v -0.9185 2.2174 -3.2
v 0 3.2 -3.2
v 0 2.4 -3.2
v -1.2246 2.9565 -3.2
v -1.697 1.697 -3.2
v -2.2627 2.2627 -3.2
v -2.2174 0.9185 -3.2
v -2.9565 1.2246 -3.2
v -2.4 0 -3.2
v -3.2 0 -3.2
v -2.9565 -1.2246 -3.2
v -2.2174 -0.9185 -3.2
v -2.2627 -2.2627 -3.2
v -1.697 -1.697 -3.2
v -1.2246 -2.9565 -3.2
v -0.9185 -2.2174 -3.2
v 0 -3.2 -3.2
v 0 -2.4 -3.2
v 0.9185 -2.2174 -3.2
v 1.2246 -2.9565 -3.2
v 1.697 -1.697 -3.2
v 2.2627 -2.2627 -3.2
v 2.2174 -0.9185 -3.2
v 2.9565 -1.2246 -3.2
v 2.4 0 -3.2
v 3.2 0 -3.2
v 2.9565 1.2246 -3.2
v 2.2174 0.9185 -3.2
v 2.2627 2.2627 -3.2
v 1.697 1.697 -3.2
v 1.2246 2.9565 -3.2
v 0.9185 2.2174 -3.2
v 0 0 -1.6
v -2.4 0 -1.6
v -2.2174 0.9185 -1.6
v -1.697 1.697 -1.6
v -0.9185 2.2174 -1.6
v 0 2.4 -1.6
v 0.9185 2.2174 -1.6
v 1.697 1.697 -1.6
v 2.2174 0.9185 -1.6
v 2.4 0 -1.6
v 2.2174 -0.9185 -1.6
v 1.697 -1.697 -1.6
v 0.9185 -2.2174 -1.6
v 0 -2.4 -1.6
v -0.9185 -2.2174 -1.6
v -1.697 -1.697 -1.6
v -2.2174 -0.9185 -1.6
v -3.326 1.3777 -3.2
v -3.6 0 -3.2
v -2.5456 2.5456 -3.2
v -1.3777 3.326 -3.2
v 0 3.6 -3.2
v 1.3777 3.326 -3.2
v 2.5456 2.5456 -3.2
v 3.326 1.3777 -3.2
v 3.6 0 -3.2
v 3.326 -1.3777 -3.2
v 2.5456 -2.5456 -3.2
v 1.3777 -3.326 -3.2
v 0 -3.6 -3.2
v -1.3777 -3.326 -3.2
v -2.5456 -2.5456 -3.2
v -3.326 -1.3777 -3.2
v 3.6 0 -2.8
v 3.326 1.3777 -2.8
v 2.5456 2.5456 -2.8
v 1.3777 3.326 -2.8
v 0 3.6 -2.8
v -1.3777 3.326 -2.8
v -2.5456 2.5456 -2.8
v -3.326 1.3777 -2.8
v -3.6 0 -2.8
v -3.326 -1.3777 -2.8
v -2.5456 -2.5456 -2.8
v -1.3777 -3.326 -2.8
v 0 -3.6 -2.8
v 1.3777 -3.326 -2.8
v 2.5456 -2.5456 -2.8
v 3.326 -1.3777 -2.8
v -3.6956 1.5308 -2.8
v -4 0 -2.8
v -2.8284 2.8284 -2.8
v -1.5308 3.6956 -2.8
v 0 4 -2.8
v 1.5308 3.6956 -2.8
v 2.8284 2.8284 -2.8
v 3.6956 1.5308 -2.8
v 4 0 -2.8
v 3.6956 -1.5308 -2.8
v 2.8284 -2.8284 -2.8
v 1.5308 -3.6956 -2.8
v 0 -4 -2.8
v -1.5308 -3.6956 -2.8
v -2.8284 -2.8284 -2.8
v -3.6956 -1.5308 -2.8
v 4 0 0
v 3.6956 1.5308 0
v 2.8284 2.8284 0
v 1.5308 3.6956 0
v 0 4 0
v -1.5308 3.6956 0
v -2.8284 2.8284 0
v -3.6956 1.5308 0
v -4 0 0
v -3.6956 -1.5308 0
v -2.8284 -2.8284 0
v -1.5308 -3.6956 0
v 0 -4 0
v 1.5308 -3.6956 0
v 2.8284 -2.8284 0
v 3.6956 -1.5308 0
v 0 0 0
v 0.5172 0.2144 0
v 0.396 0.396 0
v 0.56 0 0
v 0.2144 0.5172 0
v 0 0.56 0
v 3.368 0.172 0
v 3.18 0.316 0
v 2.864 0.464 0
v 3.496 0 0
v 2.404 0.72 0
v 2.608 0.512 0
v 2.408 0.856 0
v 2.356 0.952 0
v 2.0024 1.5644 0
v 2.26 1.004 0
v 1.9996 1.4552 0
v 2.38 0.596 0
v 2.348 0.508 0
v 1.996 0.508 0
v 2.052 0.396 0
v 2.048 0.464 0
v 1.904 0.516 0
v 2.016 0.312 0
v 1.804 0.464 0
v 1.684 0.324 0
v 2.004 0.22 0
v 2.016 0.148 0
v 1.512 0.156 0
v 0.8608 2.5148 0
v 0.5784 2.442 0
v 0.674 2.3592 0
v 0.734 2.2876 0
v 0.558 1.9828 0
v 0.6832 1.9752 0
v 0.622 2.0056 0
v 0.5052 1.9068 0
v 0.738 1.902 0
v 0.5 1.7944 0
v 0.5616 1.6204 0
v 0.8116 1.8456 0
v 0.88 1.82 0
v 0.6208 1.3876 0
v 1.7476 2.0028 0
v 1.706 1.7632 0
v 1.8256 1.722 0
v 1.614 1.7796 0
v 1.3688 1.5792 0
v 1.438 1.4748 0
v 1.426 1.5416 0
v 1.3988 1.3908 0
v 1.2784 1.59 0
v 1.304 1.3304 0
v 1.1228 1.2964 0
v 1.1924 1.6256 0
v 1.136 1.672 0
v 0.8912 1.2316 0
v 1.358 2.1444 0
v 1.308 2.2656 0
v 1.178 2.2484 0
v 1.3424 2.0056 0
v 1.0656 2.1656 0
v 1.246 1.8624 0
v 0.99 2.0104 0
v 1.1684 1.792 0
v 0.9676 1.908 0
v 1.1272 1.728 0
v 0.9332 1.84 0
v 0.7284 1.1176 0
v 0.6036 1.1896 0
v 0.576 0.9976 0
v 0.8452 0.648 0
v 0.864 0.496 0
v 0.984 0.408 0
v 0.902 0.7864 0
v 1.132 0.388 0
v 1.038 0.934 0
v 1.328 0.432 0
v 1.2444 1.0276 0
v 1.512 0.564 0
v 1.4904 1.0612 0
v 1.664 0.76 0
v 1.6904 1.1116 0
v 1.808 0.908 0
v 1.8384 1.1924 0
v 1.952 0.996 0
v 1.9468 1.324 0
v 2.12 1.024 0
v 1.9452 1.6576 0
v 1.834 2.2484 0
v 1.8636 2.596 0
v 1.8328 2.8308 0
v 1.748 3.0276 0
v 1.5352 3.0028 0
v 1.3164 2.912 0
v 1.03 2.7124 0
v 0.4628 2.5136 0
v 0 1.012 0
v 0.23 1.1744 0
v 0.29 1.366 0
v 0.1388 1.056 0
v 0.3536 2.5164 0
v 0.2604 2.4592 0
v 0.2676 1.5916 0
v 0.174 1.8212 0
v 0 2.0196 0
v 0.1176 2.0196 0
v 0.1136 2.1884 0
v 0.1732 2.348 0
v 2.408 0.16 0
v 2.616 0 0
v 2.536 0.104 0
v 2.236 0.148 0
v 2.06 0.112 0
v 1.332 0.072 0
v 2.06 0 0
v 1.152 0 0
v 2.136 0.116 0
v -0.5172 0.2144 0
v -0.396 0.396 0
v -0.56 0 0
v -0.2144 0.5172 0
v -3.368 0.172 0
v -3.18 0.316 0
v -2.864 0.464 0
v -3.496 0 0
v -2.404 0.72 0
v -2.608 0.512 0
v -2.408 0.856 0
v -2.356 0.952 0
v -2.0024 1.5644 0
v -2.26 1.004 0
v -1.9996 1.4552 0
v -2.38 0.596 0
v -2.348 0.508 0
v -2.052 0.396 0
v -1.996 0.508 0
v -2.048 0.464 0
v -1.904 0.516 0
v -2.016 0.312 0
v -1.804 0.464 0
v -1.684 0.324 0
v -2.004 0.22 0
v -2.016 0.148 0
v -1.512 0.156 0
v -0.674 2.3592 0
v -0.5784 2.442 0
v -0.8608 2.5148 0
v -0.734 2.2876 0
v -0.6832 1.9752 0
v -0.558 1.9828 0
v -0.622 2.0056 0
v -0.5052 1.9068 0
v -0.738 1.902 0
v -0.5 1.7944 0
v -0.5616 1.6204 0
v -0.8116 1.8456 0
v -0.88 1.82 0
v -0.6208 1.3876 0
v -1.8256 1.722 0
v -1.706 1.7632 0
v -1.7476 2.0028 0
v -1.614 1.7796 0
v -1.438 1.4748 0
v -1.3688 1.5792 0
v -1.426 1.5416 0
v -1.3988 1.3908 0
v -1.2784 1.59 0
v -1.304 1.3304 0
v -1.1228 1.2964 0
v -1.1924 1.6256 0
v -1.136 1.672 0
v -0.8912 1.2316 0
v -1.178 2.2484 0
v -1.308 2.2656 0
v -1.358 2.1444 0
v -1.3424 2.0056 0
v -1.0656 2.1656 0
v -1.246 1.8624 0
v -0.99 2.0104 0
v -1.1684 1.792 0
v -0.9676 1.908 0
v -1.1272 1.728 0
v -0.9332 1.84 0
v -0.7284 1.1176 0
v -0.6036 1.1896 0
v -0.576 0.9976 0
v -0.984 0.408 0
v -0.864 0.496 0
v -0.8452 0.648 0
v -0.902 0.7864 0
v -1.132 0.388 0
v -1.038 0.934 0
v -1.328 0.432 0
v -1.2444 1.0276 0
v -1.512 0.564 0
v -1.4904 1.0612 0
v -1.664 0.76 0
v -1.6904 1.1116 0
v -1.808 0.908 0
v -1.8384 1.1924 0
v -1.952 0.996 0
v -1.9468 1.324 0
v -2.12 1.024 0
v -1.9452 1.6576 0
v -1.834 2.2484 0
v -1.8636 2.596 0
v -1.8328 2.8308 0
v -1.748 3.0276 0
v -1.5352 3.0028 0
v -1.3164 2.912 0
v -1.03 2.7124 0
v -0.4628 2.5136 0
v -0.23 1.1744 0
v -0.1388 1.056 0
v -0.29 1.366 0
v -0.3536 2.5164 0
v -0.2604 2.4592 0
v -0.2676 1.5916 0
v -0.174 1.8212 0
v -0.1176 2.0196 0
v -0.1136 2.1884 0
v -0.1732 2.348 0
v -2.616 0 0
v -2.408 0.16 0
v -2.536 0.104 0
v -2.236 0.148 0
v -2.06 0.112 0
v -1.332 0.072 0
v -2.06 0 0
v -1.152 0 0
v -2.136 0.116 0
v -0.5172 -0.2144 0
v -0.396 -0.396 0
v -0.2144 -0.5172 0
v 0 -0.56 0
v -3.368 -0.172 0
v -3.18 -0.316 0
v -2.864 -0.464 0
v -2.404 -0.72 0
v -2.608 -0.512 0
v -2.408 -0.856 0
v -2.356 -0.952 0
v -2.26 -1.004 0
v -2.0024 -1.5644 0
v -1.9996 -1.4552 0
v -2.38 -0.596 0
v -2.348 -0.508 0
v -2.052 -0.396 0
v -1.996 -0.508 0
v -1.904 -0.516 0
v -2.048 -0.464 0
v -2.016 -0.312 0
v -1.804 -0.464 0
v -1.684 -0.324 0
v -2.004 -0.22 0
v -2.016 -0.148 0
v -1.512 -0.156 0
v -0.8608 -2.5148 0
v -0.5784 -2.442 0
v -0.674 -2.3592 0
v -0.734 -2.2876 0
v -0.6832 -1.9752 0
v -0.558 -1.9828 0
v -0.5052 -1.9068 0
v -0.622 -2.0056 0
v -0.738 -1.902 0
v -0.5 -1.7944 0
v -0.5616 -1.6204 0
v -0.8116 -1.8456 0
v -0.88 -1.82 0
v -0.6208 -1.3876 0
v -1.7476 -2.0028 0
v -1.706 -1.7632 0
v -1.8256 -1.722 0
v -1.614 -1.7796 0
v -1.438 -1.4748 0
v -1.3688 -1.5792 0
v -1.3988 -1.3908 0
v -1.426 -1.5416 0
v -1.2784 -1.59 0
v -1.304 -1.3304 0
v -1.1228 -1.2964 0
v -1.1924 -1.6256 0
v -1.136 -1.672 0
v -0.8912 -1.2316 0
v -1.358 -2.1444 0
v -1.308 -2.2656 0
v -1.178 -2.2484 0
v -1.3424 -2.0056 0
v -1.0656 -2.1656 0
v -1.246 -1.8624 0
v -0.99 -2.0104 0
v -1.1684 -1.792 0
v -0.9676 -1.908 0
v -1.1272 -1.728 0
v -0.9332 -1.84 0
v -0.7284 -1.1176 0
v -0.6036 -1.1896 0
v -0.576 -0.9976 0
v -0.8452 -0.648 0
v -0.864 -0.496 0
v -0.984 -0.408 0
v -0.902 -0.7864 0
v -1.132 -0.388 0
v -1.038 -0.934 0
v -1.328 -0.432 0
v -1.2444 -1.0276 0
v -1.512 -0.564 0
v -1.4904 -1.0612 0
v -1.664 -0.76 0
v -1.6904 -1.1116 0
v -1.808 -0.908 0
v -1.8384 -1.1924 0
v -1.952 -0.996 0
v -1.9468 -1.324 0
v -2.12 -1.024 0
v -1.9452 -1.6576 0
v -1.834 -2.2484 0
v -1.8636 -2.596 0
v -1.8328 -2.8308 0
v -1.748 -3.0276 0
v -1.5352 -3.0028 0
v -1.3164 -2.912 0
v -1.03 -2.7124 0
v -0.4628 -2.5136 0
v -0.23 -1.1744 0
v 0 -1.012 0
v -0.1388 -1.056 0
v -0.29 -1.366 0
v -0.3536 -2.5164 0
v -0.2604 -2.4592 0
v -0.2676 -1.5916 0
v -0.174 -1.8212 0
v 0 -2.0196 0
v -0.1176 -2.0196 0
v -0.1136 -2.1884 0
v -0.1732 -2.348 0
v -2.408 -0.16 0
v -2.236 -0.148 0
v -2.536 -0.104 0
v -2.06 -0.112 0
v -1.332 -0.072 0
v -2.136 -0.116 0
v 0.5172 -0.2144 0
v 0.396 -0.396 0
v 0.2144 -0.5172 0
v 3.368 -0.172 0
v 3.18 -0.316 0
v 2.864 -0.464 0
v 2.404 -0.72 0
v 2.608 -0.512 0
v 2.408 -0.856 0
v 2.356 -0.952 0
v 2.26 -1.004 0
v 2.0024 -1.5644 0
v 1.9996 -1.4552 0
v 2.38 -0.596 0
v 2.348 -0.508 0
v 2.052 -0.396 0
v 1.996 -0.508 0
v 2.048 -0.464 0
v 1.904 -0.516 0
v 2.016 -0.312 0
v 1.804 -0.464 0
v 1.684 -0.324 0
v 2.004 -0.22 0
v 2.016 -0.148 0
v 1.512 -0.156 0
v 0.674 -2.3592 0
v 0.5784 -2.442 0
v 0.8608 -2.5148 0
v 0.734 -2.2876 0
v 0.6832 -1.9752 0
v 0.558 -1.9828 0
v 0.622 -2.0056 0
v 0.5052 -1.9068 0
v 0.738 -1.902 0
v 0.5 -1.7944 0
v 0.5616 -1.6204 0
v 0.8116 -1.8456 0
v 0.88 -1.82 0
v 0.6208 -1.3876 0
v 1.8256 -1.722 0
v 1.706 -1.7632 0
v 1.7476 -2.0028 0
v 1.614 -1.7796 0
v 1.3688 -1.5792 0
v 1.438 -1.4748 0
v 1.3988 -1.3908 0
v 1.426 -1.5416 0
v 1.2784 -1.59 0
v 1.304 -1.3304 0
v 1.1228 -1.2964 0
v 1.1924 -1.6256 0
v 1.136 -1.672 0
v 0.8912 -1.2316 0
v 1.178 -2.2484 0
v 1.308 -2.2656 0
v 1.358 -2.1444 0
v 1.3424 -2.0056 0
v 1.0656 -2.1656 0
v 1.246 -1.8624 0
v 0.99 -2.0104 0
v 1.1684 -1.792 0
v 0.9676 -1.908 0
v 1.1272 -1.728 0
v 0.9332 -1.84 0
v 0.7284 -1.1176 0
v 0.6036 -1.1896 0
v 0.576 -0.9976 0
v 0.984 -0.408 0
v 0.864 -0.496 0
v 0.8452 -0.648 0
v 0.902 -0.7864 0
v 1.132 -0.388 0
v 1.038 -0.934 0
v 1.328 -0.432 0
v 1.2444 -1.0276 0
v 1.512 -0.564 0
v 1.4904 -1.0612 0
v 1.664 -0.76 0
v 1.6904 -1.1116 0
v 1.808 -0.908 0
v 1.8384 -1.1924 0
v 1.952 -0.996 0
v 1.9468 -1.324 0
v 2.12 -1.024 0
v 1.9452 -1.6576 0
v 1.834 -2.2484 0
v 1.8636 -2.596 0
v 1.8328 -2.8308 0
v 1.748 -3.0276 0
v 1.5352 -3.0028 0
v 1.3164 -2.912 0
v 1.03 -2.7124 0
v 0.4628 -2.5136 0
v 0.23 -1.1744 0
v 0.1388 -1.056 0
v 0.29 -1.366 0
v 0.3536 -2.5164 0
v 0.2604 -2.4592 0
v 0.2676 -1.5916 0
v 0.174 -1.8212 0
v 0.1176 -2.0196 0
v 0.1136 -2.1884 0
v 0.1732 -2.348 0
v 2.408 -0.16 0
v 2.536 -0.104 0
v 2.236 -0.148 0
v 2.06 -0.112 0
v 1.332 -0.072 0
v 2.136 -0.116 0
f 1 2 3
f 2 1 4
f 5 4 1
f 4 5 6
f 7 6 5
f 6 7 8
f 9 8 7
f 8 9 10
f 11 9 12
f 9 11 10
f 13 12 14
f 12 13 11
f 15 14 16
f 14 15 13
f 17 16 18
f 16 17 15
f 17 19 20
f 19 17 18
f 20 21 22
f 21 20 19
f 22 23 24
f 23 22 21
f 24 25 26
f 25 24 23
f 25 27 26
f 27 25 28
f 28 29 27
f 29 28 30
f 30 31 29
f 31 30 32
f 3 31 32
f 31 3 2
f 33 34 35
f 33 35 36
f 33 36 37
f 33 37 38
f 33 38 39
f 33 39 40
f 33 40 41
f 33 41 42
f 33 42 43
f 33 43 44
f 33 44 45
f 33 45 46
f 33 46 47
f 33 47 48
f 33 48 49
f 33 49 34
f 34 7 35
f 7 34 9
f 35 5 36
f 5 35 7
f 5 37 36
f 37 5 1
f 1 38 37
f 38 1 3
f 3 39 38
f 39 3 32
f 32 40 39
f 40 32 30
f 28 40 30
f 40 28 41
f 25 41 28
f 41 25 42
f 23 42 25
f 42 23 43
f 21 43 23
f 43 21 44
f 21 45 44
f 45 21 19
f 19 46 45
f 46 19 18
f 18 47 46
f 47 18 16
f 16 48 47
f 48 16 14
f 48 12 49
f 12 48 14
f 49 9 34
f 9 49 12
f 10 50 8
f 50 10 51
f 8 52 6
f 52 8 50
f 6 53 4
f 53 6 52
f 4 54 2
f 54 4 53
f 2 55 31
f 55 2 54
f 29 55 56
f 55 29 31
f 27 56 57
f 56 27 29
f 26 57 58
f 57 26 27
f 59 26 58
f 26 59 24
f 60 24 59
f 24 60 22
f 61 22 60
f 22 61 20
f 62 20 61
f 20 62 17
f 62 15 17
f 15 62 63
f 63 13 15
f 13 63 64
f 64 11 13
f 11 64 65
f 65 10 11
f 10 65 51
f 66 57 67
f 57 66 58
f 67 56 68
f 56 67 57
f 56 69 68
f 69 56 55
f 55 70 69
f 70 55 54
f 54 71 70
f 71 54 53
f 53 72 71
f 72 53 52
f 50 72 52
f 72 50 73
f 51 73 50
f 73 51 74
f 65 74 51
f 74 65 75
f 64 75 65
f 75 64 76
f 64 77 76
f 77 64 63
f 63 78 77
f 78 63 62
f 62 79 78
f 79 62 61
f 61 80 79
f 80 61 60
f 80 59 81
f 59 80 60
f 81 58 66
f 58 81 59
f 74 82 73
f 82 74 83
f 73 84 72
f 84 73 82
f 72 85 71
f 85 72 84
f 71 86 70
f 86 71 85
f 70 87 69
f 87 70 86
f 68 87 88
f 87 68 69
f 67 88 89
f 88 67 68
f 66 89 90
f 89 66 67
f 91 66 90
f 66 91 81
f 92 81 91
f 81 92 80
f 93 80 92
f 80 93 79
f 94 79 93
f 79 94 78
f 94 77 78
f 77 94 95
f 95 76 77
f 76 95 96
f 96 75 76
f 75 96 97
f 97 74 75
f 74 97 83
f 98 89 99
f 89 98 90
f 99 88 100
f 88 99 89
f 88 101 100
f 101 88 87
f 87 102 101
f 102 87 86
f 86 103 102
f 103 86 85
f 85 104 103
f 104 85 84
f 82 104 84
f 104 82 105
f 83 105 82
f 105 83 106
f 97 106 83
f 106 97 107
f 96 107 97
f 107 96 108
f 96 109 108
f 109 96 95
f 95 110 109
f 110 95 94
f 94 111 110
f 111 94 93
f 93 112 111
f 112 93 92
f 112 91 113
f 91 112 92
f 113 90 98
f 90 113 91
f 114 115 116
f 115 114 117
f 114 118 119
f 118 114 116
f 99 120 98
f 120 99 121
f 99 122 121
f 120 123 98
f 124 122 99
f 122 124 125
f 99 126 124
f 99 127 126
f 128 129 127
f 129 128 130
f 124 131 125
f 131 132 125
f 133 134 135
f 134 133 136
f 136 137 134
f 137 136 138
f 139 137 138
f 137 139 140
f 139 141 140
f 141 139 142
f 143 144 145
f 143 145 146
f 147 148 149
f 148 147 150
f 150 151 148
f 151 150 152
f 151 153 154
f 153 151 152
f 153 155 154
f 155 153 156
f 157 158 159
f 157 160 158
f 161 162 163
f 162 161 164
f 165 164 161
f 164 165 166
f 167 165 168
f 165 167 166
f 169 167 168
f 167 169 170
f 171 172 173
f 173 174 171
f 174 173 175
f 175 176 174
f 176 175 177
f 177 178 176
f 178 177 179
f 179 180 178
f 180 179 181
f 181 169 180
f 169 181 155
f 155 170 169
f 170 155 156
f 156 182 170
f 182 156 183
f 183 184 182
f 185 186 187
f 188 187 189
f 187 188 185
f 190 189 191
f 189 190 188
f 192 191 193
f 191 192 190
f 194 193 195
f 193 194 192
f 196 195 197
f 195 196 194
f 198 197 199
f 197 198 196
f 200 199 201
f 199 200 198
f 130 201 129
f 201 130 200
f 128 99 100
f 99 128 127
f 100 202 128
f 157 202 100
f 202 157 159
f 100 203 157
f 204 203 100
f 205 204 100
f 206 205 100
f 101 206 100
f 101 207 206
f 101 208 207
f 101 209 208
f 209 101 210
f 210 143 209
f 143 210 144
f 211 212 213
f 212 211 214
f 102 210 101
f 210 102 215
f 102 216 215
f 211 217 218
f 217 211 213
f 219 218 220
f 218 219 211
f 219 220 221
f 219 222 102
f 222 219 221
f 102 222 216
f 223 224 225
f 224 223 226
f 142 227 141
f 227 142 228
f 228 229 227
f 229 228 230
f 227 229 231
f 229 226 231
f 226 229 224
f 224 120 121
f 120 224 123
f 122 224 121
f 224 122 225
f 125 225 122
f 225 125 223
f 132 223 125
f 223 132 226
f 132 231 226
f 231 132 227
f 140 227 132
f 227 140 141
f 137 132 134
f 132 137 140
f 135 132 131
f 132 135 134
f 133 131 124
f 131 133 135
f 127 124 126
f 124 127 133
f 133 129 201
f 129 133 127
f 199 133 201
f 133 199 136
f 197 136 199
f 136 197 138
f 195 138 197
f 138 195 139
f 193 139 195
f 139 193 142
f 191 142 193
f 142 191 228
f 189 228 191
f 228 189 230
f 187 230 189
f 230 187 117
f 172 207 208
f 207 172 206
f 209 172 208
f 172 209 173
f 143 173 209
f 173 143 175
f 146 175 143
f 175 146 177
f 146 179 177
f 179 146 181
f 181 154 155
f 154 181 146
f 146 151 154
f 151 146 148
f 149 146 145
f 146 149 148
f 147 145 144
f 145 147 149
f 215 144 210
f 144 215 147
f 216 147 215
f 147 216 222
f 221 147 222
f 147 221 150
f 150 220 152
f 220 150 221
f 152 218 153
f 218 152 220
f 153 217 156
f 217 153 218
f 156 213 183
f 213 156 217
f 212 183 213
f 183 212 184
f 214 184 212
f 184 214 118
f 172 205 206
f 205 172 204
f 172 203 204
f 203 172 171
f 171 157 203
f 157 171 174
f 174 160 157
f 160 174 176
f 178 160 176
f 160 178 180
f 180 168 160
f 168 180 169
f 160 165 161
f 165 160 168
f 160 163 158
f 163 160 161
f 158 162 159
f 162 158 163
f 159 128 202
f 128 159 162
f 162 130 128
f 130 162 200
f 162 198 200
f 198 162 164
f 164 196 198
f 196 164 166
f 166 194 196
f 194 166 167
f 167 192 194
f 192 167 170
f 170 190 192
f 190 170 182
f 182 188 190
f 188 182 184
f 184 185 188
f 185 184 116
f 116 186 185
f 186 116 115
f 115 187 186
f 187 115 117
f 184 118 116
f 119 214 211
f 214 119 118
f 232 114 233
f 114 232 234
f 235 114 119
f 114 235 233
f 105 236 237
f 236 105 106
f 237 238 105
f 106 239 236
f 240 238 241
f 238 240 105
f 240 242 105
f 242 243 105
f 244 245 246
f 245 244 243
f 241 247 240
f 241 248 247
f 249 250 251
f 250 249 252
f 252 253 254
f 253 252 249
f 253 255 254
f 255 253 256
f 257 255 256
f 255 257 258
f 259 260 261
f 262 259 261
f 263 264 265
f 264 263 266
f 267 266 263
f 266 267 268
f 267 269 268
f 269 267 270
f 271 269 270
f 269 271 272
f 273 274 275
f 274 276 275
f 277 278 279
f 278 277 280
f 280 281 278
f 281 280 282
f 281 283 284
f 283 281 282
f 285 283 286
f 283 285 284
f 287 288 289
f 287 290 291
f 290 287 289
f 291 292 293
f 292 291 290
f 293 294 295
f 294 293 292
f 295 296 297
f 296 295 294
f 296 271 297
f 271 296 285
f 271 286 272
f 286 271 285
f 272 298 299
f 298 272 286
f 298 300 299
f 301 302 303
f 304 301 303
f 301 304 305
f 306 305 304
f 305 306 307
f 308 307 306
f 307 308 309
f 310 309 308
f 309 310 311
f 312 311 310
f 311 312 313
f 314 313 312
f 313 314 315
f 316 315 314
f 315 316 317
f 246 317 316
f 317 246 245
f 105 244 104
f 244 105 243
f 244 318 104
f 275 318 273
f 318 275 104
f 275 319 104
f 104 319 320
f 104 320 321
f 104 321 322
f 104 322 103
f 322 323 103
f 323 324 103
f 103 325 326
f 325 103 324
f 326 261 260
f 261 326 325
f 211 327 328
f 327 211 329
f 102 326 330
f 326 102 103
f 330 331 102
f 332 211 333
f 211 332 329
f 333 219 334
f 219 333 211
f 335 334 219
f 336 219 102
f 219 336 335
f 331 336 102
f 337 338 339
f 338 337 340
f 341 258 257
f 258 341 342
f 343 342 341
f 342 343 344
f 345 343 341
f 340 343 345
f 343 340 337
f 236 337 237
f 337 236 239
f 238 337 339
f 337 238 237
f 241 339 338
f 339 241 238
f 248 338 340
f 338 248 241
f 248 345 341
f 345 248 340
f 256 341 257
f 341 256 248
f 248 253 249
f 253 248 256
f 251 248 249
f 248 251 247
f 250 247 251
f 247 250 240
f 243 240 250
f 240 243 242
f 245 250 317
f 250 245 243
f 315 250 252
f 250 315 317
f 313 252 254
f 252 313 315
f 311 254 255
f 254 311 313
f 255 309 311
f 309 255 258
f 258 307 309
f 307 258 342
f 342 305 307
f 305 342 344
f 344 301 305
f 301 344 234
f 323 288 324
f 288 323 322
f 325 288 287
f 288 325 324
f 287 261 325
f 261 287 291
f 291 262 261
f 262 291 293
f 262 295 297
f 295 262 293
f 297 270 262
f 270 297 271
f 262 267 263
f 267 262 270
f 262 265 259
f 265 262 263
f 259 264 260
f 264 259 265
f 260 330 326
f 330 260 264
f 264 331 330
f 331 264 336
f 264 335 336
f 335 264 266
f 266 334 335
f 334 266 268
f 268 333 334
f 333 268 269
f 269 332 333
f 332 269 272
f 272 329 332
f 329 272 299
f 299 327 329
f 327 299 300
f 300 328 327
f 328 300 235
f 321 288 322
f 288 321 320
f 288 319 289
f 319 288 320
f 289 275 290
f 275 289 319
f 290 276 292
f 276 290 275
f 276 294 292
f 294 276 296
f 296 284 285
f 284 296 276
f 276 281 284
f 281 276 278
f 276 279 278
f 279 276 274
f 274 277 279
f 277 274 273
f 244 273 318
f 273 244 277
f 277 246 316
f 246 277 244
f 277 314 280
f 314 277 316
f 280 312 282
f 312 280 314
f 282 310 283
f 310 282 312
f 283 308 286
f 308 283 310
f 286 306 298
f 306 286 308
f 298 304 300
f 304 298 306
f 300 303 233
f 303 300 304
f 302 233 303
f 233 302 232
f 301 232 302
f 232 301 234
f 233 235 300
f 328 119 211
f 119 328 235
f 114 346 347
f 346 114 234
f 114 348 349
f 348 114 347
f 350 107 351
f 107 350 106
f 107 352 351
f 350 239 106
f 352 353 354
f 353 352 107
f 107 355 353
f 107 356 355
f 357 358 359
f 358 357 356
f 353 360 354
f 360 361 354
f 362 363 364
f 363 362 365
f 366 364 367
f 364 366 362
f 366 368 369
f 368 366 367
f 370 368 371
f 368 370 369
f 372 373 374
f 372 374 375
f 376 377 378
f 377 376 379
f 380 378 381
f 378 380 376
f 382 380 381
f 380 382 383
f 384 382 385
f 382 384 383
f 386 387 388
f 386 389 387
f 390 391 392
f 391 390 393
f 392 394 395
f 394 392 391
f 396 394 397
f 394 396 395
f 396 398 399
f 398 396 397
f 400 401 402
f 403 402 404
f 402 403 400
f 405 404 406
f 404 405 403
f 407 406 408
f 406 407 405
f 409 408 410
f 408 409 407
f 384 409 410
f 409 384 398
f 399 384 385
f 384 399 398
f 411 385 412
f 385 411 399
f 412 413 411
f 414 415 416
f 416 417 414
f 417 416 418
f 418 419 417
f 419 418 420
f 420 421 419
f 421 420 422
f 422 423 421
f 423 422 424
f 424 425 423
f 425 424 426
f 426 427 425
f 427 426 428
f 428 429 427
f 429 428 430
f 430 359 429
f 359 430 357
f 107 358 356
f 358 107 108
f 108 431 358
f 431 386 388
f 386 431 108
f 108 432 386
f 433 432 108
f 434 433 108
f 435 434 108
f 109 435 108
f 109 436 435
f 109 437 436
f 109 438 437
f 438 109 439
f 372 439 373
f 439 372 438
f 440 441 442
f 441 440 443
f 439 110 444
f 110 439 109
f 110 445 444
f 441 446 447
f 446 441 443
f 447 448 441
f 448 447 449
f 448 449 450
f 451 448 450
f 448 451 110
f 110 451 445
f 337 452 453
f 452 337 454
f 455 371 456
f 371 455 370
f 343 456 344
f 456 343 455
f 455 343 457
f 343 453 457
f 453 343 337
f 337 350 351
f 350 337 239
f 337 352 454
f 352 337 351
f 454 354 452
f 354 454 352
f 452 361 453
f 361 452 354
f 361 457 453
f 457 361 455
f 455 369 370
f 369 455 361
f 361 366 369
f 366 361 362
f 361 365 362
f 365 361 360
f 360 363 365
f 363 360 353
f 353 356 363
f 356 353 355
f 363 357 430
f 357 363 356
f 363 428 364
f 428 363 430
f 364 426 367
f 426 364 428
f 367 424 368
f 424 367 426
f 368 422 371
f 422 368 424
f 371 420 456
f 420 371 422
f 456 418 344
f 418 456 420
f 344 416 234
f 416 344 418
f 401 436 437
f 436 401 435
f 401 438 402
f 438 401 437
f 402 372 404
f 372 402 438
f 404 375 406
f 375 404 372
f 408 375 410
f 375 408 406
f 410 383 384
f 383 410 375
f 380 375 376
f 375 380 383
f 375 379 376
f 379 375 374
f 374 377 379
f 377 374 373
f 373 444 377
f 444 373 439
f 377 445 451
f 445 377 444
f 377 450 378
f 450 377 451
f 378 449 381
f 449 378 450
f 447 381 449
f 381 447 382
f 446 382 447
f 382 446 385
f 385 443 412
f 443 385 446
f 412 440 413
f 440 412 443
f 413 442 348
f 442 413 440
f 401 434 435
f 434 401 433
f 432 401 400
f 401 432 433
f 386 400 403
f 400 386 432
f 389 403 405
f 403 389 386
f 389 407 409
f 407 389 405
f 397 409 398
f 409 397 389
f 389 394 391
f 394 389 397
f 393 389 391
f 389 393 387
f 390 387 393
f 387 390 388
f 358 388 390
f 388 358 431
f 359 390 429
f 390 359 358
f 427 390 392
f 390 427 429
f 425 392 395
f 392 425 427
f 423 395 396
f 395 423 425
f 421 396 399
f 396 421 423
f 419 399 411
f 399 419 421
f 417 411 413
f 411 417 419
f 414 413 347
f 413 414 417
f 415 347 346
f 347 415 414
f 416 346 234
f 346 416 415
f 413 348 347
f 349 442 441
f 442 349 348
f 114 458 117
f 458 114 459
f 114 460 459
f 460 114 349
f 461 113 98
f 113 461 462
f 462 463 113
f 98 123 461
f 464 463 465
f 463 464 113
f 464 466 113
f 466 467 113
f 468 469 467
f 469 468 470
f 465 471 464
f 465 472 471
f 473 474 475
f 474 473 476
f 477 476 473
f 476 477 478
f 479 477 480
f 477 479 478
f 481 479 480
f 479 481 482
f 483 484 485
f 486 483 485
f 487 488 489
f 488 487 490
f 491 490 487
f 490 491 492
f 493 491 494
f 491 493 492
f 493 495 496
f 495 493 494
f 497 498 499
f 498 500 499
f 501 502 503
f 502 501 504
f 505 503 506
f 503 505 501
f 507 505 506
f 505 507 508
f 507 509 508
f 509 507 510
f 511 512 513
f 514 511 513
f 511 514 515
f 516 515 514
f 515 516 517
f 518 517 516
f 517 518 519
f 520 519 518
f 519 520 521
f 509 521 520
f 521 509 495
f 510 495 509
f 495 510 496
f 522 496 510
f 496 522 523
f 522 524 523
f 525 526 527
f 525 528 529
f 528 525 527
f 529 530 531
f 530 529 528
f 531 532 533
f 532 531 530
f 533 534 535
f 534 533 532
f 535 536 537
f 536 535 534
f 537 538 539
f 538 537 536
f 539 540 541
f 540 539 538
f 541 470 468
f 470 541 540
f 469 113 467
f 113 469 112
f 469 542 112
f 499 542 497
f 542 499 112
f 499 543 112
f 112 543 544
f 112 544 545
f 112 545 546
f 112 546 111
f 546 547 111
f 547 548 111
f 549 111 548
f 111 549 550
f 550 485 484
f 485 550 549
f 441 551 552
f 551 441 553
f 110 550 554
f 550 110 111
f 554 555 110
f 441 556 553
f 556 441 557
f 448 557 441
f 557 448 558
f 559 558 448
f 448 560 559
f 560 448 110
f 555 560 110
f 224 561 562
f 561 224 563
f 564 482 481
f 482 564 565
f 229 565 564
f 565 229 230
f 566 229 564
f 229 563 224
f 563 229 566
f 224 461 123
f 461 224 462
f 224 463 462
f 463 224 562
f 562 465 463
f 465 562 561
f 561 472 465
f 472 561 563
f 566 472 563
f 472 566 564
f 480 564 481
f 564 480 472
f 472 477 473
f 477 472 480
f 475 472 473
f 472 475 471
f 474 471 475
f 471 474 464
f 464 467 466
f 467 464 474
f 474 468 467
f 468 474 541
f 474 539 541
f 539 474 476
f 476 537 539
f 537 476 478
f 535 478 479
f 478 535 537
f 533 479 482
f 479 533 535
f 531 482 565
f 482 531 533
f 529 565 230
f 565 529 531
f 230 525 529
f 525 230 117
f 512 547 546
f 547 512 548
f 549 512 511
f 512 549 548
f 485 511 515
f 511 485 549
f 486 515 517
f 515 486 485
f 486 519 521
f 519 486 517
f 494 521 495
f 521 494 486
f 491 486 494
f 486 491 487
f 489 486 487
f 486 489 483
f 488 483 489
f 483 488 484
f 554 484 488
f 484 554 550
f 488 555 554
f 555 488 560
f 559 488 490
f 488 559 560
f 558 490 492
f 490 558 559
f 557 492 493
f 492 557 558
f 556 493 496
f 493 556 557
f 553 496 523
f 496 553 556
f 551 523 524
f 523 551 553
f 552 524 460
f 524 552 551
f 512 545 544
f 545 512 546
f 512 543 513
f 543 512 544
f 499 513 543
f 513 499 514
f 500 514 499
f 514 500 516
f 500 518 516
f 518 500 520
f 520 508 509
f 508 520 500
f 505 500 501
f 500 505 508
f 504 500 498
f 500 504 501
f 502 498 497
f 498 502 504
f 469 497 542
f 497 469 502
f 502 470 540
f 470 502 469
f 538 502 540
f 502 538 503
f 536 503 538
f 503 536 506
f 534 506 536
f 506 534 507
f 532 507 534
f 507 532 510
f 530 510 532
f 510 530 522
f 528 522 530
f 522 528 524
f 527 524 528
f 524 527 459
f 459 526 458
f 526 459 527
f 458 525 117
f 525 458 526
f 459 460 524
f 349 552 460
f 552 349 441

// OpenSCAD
use <../lib.scad>
use <../p/4-4ering.scad>
use <s/98138p0rs01.scad>
use <s/98138s02.scad>
function ldraw_lib__98138p0r() = [
// 0 Tile  1 x  1 Round with White Six-Pointed Snowflake Pattern
// 0 Name: 98138p0r.dat
// 0 Author: Gerald Lasser [GeraldLasser]
// 0 !LDRAW_ORG Part UPDATE 2026-05
// 0 !LICENSE Licensed under CC BY 4.0 : see CAreadme.txt
// 
// 0 BFC CERTIFY CCW
  [0,"BFC","CERTIFY"],
  [0,"BFC","CCW"],
// 
// 0 !KEYWORDS Bricklink 98138pb104, Brickowl 774828, Brickset 49057, CMF, Disney
// 0 !KEYWORDS Jack Skellington, Rebrickable 98138pr0113, Set 71024-16
// 
// 0 !CMDLINE -c47
// 
// 0 !HISTORY 2019-06-28 [PTadmin] Official Update 2019-01
// 0 !HISTORY 2026-01-16 [Blechtaler] subfiled, added NOCLIP
// 0 !HISTORY 2026-04-27 [OrionP] Official Update 2026-04
// 0 !HISTORY 2026-05-02 [OrionP] Fix improperly changed author
// 0 !HISTORY 2026-05-31 [OrionP] Official Update 2026-05
// 
// 1 16 0 0 0 1 0 0 0 1 0 0 0 1 s\98138s02.dat
  [1,16,0,0,0,1,0,0,0,1,0,0,0,1, ldraw_lib__s__98138s02()],
// 1 16 0 0 0 10 0 0 0 1 0 0 0 10 4-4ering.dat
  [1,16,0,0,0,10,0,0,0,1,0,0,0,10, ldraw_lib__4_4ering()],
// 1 16 0 0 0 1 0 0 0 1 0 0 0 1 s\98138p0rs01.dat
  [1,16,0,0,0,1,0,0,0,1,0,0,0,1, ldraw_lib__s__98138p0rs01()],
// 1 16 0 0 0 -1 0 0 0 1 0 0 0 1 s\98138p0rs01.dat
  [1,16,0,0,0,-1,0,0,0,1,0,0,0,1, ldraw_lib__s__98138p0rs01()],
// 1 16 0 0 0 -1 0 0 0 1 0 0 0 -1 s\98138p0rs01.dat
  [1,16,0,0,0,-1,0,0,0,1,0,0,0,-1, ldraw_lib__s__98138p0rs01()],
// 1 16 0 0 0 1 0 0 0 1 0 0 0 -1 s\98138p0rs01.dat
  [1,16,0,0,0,1,0,0,0,1,0,0,0,-1, ldraw_lib__s__98138p0rs01()],
];
module ldraw_lib__98138p0r(step=0, col=false, unit=2/5, alt=false, line=0.2, solid=!$preview)
    makepoly(ldraw_lib__98138p0r(), step=step, col=col, unit=unit, alt=alt, line=line, solid=solid);
ldraw_lib__98138p0r(line=0.2);
